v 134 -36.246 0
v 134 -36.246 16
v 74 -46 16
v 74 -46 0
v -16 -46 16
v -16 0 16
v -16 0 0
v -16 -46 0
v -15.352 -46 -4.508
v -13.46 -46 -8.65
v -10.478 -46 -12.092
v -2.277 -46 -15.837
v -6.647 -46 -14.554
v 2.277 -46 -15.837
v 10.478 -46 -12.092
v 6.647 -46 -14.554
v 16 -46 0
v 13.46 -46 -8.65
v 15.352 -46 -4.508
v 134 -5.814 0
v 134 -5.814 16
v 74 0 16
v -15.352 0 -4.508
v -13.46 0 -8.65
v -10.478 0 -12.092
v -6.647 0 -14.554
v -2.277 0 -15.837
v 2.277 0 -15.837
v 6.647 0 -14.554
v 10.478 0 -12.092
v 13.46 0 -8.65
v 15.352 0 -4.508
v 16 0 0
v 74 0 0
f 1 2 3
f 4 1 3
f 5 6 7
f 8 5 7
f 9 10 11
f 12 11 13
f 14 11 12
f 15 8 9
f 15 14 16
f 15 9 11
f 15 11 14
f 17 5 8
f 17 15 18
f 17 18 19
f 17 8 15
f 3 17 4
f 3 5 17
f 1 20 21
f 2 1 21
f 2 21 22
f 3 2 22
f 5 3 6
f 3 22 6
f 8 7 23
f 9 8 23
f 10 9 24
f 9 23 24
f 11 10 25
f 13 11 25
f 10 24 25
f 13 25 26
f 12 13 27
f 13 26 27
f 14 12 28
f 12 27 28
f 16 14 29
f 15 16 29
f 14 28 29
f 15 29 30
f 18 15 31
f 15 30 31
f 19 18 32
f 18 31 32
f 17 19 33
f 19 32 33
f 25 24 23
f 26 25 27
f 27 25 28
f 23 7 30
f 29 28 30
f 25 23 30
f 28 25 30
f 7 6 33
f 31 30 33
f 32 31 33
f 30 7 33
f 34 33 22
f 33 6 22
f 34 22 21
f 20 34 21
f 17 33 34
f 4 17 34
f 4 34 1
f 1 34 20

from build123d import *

# Parameters (mm, degrees)
F1_DEPTH = 46
F2_DEPTH = 46
F4_DEPTH = 25


with BuildPart() as f1:
    # F0 (on Front) → F1 (new body)
    with BuildSketch(Plane.XZ):
        with BuildLine():
            Line((-16, 16), (-16, 0))
            ThreePointArc((-16, 0), (0, -16), (16, 0))
            Line((16, 0), (134, 0))
            Line((134, 0), (134, 16))
            Line((134, 16), (-16, 16))
        make_face()
    extrude(amount=F1_DEPTH)

    # F0 (on Front) → F2 (join)
    with BuildSketch(Plane.XZ):
        with BuildLine():
            Line((-16, 16), (-16, 0))
            ThreePointArc((-16, 0), (0, -16), (16, 0))
            Line((16, 0), (134, 0))
            Line((134, 0), (134, 16))
            Line((134, 16), (-16, 16))
        make_face()
    extrude(amount=F2_DEPTH)

    # F3 (on face) → F4 (cut)
    with BuildSketch(Plane.XY.offset(16)):
        Polygon((134, -36.245503), (74, -46), (134, -46), align=None)
        Polygon((134, 0), (74, 0), (134, -5.8145), align=None)
    extrude(amount=-F4_DEPTH, mode=Mode.SUBTRACT)


solid = f1.part
